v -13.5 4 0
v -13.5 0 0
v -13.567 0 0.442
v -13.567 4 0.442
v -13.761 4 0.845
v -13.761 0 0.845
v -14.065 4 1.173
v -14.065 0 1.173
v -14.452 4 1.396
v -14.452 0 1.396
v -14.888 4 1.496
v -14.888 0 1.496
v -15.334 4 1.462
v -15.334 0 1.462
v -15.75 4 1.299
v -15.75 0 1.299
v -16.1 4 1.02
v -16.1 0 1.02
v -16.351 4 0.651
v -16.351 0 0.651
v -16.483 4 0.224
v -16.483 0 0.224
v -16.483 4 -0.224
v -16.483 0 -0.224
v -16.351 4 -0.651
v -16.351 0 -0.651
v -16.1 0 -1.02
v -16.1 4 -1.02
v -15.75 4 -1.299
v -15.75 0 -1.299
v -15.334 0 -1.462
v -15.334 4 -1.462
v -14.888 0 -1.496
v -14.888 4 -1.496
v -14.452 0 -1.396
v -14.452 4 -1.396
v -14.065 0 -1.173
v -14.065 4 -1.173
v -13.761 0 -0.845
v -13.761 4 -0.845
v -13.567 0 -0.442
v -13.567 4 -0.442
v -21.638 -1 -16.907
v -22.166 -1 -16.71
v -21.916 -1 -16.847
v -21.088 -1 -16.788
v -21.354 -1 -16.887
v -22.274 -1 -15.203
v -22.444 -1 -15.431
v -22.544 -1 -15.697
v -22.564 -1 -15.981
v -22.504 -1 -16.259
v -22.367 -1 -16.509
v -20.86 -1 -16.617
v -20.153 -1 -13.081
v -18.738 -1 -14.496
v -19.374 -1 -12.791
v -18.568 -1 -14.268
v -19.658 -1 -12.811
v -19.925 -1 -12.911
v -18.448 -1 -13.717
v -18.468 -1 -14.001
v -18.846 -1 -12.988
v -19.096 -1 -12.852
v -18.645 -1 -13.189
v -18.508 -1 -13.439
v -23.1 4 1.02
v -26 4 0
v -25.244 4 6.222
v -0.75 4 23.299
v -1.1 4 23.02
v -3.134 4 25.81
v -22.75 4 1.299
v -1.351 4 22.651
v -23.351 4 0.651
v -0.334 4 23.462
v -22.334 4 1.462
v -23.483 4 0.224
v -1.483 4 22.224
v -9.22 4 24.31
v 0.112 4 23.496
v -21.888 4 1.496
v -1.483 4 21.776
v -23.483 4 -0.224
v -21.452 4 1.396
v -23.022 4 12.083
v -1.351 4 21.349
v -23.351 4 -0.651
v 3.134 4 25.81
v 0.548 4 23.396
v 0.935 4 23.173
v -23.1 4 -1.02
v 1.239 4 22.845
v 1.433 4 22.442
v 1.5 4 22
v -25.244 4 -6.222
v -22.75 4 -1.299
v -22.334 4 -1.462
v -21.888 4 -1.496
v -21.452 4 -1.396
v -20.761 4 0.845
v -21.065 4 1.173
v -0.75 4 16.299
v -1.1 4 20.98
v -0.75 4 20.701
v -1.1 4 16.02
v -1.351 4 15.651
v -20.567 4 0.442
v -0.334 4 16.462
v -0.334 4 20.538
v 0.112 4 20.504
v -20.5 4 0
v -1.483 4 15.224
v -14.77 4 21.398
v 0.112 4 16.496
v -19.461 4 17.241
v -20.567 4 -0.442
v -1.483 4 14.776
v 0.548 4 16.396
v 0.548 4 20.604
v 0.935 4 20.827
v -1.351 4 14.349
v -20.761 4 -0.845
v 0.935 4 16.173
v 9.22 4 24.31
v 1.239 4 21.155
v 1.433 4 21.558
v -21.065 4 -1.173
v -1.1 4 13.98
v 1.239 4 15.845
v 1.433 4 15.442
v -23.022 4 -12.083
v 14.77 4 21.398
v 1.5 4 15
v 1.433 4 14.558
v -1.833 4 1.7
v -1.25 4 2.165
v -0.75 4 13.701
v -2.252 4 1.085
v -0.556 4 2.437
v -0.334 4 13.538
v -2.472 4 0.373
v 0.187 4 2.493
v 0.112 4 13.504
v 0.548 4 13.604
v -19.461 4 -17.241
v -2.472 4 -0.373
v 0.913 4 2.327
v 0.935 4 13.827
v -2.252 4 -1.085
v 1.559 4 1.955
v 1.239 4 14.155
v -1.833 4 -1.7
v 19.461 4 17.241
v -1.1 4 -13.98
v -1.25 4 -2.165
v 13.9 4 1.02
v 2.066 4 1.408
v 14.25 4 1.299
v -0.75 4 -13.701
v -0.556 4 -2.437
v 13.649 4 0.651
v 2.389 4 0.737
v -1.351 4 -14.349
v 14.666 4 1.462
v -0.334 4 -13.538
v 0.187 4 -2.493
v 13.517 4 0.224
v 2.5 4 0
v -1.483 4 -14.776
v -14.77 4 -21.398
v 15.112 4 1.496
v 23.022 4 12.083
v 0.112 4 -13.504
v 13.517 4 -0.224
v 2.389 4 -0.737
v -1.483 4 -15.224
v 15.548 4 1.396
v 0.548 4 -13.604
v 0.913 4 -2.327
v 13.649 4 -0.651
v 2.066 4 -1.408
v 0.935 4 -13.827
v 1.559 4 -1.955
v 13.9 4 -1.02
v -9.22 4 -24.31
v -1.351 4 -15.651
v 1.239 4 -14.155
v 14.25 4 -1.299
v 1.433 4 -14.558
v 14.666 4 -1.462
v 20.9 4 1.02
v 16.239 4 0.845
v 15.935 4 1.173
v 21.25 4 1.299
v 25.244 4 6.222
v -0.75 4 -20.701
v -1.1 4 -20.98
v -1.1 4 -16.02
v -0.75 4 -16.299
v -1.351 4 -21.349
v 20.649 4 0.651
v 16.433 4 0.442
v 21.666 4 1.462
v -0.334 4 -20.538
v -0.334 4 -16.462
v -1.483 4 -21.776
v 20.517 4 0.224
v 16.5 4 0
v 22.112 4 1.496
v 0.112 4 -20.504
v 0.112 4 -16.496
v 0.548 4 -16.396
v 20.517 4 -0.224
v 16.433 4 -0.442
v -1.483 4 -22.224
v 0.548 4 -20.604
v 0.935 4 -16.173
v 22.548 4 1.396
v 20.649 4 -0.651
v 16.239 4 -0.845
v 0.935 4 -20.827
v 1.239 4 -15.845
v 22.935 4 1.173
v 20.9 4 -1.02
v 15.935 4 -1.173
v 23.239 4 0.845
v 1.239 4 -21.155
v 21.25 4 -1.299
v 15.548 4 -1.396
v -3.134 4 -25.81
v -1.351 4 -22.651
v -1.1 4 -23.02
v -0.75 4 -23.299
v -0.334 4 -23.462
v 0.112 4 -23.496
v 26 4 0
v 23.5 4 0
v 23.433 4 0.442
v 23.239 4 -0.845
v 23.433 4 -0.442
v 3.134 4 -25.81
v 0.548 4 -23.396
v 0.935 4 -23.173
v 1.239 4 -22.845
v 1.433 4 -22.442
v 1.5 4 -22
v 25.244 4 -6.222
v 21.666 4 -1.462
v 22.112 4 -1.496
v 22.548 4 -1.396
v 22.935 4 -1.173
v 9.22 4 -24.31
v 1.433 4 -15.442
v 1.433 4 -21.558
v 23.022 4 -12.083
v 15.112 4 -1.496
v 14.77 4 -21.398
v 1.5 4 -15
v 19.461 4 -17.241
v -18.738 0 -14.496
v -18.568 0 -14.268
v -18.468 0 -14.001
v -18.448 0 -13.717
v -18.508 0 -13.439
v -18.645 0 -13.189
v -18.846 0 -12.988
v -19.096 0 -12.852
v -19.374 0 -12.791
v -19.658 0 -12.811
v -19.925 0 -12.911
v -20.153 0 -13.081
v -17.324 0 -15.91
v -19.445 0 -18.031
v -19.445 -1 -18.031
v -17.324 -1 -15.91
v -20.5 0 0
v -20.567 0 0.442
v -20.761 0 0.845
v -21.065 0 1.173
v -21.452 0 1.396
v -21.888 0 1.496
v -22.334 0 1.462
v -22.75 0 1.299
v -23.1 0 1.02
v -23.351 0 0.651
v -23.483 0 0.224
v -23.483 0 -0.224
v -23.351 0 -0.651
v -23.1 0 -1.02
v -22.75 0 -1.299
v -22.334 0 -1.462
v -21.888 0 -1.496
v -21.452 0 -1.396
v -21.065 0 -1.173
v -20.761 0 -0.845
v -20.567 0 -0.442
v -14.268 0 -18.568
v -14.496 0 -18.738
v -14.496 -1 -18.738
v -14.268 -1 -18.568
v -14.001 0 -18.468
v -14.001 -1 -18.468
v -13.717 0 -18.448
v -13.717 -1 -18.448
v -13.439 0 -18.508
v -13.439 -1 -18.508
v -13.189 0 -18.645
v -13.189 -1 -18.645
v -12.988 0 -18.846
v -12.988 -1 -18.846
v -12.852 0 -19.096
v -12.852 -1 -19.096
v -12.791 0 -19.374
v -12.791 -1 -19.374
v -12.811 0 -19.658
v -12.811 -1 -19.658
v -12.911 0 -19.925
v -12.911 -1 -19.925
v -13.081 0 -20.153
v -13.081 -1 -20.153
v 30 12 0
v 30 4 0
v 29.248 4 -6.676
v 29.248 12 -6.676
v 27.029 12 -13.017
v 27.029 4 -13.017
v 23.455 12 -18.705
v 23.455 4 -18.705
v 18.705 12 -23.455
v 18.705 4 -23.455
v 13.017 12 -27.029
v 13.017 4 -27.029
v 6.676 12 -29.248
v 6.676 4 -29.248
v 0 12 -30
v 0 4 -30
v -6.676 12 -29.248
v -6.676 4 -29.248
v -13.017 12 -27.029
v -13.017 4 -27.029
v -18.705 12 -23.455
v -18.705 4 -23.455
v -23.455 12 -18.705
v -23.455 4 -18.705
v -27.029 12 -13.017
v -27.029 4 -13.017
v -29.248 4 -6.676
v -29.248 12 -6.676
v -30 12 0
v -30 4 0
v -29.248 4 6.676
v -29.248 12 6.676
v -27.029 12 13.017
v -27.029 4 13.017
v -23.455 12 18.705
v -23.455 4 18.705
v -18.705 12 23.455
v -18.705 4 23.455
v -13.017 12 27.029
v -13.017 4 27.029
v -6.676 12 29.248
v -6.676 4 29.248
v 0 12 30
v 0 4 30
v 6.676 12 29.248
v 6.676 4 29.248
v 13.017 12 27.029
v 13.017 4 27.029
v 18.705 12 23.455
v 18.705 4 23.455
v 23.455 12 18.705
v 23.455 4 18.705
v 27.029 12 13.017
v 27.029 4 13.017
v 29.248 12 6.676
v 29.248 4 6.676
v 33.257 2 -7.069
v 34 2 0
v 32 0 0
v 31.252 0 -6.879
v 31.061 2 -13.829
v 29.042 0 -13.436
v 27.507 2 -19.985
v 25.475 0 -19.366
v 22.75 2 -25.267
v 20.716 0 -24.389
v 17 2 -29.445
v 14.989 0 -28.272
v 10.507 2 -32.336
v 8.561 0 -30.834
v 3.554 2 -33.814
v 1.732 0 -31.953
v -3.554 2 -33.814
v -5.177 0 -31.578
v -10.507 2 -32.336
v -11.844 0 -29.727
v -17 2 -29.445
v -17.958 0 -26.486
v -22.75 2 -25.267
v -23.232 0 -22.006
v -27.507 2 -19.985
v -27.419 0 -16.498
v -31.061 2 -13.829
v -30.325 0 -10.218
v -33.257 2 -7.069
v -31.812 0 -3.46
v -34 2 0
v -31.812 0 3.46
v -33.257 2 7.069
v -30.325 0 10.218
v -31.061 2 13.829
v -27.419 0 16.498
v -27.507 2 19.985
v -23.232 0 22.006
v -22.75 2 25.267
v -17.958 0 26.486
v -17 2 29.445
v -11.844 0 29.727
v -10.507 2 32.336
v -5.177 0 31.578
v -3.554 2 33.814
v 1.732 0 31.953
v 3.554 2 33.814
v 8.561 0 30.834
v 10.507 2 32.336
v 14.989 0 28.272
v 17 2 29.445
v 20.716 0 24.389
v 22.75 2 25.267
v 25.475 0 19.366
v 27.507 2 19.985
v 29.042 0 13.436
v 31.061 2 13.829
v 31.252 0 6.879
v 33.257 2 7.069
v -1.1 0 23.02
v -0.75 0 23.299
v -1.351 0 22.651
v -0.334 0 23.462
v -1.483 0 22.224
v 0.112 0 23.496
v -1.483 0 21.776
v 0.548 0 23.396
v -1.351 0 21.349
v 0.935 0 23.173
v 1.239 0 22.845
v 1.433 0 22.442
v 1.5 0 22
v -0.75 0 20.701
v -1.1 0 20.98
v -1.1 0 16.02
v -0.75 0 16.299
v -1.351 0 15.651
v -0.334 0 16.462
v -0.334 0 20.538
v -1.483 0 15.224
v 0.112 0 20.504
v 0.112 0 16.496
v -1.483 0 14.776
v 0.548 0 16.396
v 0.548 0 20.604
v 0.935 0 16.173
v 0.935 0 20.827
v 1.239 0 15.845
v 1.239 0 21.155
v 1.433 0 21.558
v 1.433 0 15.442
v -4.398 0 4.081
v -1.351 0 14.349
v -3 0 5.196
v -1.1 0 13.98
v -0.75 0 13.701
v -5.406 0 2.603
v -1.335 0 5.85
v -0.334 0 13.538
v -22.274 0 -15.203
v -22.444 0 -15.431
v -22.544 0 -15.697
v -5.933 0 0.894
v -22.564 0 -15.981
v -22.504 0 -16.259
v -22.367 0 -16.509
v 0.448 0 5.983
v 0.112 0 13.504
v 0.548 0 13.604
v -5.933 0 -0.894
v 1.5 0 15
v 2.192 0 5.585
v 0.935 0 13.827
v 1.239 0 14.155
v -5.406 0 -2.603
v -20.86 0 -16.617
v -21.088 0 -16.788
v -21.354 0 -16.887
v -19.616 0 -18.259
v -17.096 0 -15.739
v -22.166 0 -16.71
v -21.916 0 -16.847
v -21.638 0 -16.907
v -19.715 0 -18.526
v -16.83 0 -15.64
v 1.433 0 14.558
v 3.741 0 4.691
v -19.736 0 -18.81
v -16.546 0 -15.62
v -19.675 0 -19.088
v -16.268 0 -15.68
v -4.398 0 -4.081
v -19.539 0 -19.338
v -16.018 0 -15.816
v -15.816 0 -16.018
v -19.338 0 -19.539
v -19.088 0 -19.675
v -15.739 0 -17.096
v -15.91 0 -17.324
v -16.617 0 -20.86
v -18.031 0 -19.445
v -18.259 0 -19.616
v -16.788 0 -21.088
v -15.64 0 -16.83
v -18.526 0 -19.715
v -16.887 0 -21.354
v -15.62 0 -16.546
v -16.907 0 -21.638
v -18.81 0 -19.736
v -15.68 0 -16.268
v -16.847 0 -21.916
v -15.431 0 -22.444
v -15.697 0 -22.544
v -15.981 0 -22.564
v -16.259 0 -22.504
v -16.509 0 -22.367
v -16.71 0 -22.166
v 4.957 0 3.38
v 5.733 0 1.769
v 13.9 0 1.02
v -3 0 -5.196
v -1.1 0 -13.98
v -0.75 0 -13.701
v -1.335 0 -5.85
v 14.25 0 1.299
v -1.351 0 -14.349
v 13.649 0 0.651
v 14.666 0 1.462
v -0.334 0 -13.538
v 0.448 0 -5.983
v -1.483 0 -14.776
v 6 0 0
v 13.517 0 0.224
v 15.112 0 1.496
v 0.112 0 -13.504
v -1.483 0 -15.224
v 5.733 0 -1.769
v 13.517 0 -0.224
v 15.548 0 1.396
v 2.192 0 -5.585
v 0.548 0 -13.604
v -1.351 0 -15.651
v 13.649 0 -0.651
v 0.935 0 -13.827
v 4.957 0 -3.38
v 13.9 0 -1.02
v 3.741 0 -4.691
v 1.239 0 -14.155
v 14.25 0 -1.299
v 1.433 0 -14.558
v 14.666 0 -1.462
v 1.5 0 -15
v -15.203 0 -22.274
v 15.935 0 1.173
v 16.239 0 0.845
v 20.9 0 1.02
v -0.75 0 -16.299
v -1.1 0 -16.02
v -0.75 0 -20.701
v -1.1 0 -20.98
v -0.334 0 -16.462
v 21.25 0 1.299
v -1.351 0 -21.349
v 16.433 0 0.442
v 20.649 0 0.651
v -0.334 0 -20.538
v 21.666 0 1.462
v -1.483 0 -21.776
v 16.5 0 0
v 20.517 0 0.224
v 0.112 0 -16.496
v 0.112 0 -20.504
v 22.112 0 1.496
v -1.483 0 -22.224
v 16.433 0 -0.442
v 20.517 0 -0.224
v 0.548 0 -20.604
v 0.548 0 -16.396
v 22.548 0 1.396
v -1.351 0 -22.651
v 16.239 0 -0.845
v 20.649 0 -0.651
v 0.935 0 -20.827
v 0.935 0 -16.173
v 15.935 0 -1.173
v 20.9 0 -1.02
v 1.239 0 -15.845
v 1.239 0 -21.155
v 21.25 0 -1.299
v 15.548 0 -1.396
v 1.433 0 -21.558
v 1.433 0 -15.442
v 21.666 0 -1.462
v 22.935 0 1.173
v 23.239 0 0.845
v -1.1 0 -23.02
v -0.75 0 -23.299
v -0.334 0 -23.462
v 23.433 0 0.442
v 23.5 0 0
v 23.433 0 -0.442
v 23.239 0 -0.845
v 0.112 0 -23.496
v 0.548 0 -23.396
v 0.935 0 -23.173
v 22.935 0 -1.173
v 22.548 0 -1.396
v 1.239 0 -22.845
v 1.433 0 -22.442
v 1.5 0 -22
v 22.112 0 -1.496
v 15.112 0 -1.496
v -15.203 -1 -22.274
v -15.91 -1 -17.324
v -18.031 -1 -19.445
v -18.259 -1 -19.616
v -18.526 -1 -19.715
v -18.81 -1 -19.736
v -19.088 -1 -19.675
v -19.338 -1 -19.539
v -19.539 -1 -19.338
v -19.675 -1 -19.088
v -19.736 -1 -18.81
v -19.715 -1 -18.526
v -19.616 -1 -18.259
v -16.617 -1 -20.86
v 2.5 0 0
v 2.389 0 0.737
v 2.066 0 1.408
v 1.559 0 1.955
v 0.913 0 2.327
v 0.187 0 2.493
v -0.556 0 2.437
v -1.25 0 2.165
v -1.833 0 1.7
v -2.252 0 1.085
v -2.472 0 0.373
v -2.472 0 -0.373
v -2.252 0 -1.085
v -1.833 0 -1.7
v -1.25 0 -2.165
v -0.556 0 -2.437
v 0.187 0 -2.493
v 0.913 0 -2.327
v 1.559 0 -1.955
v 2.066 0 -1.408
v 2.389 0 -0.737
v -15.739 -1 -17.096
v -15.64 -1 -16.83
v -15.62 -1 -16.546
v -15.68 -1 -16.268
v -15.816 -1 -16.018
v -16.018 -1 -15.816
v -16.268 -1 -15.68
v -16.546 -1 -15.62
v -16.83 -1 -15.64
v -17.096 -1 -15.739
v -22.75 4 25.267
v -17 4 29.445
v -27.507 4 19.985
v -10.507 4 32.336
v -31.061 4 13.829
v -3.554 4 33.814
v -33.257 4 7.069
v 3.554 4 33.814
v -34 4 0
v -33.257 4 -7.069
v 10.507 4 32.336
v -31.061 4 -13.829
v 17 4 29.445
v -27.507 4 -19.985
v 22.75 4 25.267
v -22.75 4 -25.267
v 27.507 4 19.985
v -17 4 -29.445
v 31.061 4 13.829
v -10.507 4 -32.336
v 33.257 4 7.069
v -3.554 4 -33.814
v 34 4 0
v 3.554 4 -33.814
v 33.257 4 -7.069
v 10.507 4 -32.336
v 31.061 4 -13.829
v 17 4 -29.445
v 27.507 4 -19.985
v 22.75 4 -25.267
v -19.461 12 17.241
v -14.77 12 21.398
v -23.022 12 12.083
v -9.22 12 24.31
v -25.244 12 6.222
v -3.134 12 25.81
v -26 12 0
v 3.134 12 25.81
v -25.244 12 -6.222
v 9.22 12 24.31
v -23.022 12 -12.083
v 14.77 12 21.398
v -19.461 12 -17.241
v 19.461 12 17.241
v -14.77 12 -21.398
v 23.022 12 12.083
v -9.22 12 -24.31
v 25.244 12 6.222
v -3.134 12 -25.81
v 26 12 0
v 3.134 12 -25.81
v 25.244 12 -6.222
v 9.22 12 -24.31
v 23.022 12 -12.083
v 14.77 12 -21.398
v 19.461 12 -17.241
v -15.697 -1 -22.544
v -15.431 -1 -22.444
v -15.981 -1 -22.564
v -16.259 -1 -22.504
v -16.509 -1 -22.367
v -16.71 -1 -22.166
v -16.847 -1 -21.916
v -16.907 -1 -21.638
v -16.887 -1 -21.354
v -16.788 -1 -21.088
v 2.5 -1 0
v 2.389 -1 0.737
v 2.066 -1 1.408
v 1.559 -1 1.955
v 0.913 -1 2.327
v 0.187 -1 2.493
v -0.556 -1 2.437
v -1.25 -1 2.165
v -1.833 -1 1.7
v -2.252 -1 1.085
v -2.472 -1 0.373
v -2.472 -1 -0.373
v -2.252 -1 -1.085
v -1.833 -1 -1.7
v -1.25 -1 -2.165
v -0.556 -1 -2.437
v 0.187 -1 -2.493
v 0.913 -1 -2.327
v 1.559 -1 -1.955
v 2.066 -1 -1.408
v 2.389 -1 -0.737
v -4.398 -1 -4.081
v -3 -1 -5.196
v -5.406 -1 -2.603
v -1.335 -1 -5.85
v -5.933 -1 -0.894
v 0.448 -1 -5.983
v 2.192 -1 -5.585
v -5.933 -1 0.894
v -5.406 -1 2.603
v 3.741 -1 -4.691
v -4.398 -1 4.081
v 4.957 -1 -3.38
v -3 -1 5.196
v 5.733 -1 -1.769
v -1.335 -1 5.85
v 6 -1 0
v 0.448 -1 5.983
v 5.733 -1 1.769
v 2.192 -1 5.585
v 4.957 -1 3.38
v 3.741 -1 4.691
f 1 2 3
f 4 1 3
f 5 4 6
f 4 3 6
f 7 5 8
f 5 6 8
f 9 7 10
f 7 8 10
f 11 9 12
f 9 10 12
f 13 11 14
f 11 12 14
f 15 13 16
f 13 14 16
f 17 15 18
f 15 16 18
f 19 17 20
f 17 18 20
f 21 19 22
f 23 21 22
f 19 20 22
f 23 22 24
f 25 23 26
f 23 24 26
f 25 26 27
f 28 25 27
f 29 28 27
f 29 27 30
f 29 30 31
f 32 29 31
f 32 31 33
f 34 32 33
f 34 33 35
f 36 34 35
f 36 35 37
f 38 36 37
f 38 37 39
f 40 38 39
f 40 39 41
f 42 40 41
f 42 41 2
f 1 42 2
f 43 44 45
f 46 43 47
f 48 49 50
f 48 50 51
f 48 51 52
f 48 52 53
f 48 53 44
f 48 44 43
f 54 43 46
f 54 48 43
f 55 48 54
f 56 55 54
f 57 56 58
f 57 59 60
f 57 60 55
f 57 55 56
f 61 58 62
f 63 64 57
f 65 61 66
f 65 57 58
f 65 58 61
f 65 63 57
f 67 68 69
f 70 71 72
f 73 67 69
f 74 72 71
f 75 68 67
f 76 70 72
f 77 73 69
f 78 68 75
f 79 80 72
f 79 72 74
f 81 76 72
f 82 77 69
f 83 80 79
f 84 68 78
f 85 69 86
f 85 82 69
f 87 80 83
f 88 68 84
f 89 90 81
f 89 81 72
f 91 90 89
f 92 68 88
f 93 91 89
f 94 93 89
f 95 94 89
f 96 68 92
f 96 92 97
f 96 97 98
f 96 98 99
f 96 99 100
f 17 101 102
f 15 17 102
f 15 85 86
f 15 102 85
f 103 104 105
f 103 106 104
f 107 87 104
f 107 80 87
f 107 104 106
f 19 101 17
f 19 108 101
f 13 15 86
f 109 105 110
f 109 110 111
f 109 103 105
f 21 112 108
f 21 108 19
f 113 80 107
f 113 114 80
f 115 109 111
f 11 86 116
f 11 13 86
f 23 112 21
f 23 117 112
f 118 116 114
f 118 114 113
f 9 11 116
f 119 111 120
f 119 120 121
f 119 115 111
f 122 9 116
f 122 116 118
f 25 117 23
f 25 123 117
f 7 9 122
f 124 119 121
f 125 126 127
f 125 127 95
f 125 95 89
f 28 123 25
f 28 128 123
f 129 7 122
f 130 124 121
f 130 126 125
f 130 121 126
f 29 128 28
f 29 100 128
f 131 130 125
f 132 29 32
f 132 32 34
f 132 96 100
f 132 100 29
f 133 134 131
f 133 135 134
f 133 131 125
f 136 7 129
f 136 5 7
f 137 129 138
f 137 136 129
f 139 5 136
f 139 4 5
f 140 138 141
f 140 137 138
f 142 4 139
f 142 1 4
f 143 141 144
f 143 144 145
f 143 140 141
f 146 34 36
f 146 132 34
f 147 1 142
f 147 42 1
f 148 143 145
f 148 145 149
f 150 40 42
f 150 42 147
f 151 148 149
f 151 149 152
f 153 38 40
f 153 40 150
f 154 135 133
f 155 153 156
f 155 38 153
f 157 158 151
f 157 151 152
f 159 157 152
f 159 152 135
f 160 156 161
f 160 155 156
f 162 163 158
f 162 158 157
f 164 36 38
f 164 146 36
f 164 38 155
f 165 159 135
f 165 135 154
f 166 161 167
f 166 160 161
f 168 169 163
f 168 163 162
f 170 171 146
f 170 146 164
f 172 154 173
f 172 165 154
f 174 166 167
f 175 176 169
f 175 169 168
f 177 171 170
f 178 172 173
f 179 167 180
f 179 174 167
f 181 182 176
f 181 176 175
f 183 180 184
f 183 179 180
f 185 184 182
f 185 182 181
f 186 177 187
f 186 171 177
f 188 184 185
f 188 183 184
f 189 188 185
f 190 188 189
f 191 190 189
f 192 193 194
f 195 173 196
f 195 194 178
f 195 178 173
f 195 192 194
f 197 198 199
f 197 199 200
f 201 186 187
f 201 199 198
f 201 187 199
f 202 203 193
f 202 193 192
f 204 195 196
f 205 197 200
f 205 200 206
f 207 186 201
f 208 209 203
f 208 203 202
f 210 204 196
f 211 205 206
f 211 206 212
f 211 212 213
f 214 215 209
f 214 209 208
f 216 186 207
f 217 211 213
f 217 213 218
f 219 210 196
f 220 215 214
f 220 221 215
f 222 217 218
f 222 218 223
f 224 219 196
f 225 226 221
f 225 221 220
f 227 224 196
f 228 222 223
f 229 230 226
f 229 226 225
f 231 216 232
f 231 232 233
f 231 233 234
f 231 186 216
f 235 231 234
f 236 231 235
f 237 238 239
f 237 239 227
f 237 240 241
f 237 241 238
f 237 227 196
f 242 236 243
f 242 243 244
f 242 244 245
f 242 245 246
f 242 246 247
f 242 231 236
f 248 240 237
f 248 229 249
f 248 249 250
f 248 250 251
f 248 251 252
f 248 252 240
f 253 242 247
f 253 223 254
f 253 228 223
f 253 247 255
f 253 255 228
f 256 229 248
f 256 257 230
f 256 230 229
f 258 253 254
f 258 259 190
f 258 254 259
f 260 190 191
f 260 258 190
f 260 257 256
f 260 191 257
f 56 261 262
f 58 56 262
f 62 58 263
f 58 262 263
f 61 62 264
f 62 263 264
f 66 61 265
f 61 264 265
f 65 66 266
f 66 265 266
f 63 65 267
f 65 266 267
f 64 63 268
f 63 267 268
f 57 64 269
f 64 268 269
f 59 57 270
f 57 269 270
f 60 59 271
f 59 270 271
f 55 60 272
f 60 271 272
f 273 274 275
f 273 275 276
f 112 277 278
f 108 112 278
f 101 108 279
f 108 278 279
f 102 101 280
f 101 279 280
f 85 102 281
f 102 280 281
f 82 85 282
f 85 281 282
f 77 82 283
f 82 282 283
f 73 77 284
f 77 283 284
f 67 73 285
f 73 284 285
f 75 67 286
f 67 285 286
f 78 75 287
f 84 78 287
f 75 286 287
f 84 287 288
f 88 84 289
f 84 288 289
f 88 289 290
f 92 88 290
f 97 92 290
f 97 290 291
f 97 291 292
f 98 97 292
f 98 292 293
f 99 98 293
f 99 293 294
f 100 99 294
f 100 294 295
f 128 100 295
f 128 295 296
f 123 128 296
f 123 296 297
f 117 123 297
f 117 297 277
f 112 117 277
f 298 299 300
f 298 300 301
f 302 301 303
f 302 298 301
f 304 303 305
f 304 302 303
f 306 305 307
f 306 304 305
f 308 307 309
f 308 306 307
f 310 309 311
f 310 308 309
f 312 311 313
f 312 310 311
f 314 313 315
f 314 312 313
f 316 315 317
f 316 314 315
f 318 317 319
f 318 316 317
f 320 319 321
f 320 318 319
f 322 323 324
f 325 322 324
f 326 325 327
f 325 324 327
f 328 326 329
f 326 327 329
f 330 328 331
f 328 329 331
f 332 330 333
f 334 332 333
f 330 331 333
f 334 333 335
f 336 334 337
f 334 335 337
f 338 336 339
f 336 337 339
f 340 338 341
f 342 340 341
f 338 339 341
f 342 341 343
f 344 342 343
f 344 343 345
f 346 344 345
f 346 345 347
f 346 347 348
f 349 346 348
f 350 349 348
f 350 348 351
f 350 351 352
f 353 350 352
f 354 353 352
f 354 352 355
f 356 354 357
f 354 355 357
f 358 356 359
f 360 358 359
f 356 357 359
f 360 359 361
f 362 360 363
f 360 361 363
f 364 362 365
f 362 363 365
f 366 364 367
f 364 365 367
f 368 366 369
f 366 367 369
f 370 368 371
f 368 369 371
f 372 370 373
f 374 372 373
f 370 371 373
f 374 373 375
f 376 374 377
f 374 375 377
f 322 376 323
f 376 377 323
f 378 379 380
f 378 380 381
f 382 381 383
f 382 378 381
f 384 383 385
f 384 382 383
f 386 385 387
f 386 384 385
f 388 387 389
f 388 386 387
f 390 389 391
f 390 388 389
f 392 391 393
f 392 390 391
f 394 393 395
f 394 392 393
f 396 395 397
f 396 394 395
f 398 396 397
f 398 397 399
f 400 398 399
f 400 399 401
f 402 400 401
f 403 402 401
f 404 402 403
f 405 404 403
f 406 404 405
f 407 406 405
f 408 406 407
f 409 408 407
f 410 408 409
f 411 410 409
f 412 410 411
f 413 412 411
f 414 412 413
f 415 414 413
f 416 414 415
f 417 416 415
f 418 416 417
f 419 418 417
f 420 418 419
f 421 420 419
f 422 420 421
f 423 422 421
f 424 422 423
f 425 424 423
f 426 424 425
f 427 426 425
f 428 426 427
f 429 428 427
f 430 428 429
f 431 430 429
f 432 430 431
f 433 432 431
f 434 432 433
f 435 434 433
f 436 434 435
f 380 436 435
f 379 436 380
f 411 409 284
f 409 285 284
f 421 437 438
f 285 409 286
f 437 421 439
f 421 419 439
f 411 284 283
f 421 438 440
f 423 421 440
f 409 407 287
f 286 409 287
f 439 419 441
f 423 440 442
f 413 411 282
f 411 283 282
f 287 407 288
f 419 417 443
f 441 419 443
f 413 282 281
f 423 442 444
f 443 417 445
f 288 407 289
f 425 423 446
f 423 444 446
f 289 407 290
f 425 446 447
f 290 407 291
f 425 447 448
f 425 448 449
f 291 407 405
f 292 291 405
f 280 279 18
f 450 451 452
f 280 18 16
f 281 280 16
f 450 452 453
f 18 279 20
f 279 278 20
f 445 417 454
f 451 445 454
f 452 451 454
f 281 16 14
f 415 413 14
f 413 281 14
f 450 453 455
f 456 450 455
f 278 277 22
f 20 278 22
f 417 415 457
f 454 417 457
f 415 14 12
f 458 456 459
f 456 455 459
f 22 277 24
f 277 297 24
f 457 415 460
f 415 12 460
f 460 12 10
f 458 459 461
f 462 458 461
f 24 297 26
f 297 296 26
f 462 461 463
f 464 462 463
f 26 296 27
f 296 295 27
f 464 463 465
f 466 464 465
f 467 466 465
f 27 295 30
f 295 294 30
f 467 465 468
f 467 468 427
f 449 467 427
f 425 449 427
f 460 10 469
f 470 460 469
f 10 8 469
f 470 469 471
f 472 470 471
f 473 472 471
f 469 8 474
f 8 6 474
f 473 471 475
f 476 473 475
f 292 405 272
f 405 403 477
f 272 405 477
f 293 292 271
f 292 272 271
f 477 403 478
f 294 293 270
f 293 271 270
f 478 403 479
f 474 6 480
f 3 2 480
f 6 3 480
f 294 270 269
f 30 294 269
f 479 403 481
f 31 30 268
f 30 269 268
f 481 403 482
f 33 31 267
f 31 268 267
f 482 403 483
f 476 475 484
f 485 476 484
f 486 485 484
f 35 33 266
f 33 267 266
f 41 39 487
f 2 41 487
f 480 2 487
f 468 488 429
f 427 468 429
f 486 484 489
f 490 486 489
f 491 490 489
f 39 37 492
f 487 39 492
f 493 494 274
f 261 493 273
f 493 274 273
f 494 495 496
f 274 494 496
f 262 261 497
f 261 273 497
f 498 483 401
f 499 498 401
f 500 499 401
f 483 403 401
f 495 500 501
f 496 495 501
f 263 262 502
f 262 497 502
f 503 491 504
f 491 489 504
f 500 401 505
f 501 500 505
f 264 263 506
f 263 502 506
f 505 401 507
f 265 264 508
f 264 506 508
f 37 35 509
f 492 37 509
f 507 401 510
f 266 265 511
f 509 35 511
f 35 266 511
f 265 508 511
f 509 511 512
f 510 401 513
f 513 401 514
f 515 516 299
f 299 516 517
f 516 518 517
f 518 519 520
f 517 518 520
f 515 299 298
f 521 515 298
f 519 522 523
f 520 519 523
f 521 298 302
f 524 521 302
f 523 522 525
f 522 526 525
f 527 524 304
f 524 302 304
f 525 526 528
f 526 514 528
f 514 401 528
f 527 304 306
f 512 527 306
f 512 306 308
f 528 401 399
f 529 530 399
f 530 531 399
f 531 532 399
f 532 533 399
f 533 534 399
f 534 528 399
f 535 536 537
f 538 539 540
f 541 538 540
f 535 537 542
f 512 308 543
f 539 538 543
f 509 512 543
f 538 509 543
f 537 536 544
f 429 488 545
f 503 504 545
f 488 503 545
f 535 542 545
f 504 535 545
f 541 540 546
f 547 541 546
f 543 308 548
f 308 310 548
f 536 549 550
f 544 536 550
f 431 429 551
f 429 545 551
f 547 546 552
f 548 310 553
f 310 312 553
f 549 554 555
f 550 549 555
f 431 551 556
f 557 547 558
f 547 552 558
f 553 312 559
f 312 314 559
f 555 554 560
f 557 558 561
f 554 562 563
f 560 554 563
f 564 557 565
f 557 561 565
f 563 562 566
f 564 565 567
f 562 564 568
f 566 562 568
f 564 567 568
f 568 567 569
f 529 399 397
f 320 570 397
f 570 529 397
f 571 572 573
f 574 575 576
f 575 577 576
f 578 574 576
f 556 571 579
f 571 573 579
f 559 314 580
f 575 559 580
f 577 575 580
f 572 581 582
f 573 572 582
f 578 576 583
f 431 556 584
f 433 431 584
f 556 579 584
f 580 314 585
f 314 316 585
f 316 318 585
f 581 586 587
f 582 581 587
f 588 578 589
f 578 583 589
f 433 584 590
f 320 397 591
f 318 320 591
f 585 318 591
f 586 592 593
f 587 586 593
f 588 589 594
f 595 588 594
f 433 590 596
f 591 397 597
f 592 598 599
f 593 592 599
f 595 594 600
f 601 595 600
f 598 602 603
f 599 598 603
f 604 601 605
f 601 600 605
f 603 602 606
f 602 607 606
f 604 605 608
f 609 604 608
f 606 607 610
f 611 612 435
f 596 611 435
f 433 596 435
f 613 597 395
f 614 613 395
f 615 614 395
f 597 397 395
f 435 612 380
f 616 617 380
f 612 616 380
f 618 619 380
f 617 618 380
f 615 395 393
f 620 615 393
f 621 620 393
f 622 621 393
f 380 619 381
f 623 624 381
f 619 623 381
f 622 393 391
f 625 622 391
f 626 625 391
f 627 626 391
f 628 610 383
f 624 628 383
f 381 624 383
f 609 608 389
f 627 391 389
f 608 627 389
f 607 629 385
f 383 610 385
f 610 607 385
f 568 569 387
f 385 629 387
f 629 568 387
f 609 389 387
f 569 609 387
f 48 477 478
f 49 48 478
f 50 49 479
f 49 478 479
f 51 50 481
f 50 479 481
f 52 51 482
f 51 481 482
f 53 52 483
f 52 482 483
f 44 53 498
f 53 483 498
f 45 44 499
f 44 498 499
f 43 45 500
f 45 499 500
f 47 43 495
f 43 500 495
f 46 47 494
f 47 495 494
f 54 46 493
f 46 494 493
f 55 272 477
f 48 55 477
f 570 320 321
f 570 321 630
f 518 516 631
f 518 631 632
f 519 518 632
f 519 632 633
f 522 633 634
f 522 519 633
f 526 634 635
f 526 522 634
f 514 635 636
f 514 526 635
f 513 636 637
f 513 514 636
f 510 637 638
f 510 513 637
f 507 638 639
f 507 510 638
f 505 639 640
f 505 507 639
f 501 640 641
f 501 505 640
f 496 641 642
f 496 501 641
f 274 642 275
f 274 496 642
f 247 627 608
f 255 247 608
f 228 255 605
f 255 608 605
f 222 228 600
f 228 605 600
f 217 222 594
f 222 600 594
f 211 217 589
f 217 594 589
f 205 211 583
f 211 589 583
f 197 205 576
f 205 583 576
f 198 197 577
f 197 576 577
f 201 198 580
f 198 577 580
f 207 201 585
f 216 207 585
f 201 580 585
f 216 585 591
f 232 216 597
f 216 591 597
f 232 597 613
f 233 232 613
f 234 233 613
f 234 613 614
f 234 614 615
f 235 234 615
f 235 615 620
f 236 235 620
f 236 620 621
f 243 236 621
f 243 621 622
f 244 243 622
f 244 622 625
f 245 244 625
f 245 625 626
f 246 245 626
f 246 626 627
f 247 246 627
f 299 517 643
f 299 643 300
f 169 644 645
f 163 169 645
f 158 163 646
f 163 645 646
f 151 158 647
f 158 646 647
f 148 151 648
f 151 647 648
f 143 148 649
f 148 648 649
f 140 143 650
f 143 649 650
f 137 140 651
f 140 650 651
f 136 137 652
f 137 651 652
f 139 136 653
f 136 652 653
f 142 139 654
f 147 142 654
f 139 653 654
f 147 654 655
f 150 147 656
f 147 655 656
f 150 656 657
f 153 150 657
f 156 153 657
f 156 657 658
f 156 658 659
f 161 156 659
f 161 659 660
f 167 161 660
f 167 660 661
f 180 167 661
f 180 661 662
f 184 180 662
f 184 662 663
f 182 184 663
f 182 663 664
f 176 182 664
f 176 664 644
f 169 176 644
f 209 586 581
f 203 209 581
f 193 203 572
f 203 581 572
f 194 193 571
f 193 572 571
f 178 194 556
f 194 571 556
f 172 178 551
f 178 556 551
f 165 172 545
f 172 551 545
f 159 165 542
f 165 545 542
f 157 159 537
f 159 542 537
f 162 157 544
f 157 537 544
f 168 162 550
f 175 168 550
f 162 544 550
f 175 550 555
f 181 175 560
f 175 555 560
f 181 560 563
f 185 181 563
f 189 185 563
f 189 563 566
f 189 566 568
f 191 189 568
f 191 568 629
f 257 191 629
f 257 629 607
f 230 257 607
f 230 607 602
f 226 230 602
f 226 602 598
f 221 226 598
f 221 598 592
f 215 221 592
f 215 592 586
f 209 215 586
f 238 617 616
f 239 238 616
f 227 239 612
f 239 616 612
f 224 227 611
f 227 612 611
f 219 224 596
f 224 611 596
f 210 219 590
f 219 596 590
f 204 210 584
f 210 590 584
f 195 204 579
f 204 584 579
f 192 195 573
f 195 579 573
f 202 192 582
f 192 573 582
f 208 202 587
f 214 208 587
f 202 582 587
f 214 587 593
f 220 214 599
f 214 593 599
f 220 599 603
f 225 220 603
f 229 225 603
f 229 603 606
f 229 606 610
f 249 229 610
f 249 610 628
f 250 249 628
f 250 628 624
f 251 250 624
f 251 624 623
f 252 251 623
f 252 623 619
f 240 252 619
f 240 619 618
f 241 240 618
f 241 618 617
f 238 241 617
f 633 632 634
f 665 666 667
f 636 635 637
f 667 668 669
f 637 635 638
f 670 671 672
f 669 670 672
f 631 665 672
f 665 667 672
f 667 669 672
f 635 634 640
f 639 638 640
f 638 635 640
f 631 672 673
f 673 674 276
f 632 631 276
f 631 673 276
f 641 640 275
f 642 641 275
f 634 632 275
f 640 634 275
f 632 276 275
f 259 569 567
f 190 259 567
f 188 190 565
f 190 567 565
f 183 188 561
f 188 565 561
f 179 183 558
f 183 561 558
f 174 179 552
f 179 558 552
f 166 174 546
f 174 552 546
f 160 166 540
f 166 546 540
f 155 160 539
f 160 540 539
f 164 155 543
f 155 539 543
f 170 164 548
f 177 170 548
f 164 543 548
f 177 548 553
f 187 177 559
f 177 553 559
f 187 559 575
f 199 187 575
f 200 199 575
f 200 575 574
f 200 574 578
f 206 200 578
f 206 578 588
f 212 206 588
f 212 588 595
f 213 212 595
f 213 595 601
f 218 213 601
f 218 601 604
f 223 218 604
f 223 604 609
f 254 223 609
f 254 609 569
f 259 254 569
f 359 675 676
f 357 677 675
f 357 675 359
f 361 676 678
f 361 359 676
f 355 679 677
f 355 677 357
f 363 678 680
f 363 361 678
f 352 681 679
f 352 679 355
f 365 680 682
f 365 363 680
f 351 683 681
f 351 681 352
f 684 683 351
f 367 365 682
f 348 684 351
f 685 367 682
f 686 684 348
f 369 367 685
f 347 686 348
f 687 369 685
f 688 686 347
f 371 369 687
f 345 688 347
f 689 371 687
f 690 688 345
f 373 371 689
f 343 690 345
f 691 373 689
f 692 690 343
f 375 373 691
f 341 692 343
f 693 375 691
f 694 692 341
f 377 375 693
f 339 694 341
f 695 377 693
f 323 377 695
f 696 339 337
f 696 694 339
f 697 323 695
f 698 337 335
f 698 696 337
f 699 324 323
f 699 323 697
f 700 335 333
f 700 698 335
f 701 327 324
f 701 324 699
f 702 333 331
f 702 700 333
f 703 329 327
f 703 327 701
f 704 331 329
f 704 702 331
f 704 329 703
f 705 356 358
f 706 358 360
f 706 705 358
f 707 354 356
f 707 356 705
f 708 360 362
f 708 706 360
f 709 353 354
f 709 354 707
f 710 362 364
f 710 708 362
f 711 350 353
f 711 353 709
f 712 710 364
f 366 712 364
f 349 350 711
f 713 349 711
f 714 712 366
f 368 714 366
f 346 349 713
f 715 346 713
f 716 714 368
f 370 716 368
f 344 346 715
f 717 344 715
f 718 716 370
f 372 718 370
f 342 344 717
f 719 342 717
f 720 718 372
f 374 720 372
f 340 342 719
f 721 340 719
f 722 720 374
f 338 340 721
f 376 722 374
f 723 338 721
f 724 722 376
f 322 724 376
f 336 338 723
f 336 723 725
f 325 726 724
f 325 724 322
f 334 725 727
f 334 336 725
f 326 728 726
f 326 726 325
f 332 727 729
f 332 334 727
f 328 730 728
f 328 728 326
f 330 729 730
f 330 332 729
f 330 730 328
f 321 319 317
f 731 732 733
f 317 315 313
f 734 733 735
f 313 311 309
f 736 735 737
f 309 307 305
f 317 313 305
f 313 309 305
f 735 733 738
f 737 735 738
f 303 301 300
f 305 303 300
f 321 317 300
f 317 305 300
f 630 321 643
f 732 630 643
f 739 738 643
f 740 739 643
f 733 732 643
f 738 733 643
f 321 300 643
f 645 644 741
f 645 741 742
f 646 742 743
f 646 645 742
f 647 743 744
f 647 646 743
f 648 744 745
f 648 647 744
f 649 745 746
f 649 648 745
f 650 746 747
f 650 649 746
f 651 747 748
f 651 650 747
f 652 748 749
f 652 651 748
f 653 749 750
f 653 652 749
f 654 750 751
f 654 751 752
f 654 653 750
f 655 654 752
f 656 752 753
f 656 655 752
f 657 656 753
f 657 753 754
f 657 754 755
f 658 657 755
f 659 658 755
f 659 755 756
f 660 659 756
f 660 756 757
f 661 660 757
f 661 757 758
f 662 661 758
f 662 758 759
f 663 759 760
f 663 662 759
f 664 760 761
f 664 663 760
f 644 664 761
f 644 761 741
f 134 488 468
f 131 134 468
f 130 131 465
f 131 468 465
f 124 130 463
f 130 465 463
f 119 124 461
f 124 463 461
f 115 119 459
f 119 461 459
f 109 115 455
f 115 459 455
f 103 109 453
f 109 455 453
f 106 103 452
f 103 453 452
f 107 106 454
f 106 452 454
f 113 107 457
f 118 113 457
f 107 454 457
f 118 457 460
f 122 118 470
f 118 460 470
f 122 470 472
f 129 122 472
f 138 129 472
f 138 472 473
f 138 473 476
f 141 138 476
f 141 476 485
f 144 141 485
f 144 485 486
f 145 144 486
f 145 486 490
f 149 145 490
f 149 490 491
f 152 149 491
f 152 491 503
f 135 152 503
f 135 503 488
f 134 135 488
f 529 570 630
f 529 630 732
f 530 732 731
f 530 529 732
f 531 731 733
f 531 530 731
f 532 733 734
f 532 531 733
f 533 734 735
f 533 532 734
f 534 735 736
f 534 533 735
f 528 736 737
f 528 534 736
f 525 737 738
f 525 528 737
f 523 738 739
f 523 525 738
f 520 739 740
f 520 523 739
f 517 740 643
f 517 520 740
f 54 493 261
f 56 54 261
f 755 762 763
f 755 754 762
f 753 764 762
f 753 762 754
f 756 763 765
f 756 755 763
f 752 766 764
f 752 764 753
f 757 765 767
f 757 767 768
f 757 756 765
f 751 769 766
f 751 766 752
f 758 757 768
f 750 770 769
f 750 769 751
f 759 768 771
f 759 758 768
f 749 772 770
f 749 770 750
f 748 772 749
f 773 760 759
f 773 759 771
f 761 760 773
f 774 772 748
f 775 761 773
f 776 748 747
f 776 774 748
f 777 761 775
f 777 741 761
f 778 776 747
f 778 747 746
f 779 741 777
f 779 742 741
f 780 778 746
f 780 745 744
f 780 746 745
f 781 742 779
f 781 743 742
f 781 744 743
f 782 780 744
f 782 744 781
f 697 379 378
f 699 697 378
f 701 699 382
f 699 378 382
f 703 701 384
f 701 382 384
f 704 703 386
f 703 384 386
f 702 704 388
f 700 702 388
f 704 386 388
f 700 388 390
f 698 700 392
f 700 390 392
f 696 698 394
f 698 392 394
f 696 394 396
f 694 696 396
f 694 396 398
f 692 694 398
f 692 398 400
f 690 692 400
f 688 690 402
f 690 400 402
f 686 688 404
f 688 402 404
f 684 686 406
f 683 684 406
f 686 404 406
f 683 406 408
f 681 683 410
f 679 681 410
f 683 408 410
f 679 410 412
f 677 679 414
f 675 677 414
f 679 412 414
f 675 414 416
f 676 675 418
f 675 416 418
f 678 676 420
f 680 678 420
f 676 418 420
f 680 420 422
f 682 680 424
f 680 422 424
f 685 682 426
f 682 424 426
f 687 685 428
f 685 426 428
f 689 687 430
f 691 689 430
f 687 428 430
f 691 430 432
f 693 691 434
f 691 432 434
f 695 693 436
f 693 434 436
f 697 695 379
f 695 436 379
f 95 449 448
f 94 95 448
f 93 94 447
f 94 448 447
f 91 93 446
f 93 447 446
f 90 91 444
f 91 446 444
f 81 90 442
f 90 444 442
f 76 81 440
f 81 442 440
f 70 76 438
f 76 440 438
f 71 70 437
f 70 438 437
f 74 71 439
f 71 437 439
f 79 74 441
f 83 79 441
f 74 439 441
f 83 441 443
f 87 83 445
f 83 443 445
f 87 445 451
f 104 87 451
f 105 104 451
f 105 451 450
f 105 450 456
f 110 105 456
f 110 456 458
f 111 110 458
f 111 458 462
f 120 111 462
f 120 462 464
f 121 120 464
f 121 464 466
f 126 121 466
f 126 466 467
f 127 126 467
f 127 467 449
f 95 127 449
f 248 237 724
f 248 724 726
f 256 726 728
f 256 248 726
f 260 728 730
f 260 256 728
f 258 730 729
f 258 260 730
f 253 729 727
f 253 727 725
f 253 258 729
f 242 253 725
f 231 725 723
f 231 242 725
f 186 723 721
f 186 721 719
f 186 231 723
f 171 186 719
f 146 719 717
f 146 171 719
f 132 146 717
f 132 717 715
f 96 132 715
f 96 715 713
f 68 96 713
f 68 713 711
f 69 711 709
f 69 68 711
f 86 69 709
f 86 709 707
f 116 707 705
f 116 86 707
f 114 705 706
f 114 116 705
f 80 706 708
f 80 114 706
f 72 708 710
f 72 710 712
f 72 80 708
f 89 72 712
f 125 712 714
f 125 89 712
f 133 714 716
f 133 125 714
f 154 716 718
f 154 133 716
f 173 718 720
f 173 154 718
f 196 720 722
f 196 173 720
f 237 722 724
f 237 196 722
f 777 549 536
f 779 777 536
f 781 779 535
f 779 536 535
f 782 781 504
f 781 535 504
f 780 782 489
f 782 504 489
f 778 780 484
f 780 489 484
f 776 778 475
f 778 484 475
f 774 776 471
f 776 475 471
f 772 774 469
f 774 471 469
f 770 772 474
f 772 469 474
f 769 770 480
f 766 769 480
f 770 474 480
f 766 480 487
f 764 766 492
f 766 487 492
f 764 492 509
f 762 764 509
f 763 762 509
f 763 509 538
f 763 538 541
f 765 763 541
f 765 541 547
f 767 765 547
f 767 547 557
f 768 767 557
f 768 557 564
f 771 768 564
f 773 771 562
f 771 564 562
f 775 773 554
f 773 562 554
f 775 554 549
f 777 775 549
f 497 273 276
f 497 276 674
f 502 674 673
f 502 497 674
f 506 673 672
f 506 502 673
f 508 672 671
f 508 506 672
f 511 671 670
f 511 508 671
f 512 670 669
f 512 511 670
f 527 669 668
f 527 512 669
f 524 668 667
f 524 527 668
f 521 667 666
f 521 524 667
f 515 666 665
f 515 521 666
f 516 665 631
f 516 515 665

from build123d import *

# Parameters (mm, degrees)
SKETCH_1_R          = 34
EXTRUDE_1_DEPTH     = 4
SKETCH_2_R          = 30
SKETCH_2_R_2        = 26
EXTRUDE_2_DEPTH     = 8
SKETCH_3_R          = 2.5
SKETCH_3_R_2        = 1.5
CUT_EXTRUDE_1_DEPTH = 13
SKETCH_4_R          = 6
SKETCH_4_R_2        = 2.5
EXTRUDE_3_DEPTH     = 1
CHAMFER_1_SIZE      = 2
EXTRUDE_4_DEPTH     = 1


with BuildPart() as part:
    # 草图1 → 凸台-拉伸1 (new body)
    with BuildSketch(Plane(origin=(0, 0, 0), x_dir=(1, 0, 0), z_dir=(0, 1, 0))):
        Circle(SKETCH_1_R)
    extrude(amount=EXTRUDE_1_DEPTH)

    # 草图2 → 凸台-拉伸2 (add)
    with BuildSketch(Plane(origin=(0, 4, 0), x_dir=(1, 0, 0), z_dir=(0, 1, 0))):
        Circle(SKETCH_2_R)
        Circle(SKETCH_2_R_2, mode=Mode.SUBTRACT)
    extrude(amount=EXTRUDE_2_DEPTH)

    # 草图3 → 切除-拉伸1 (cut, through all)
    with BuildSketch(Plane.XZ):
        Circle(SKETCH_3_R)
        with Locations((0, 15)):
            Circle(SKETCH_3_R_2)
        with Locations((0, 22)):
            Circle(SKETCH_3_R_2)
        with Locations((15, 0)):
            Circle(SKETCH_3_R_2)
        with Locations((22, 0)):
            Circle(SKETCH_3_R_2)
        with Locations((0, -15)):
            Circle(SKETCH_3_R_2)
        with Locations((0, -22)):
            Circle(SKETCH_3_R_2)
        with Locations((-15, 0)):
            Circle(SKETCH_3_R_2)
        with Locations((-22, 0)):
            Circle(SKETCH_3_R_2)
    extrude(amount=-CUT_EXTRUDE_1_DEPTH, mode=Mode.SUBTRACT)

    # 草图4 → 凸台-拉伸3 (add)
    with BuildSketch(Plane.XZ):
        Circle(SKETCH_4_R)
        Circle(SKETCH_4_R_2, mode=Mode.SUBTRACT)
    extrude(amount=EXTRUDE_3_DEPTH)

    # 倒角1
    chamfer_1_edges = [part.edges().sort_by_distance(p)[0] for p in [
        (-34, 0, 0),
    ]]
    chamfer(chamfer_1_edges, length=CHAMFER_1_SIZE)

    # 草图5 → 凸台-拉伸4 (add)
    with BuildSketch(Plane.XZ):
        with BuildLine():
            Line((-19.445436483, -18.03122292), (-17.324116139, -15.909902577))
            ThreePointArc((-17.324116139, -15.909902577), (-15.909902577, -15.909902577), (-15.909902577, -17.324116139))
            Line((-15.909902577, -17.324116139), (-18.03122292, -19.445436483))
            ThreePointArc((-18.03122292, -19.445436483), (-19.445436483, -19.445436483), (-19.445436483, -18.03122292))
        make_face()
        with BuildLine():
            Line((-13.081475452, -20.152543264), (-15.202795796, -22.273863607))
            ThreePointArc((-15.202795796, -22.273863607), (-16.617009358, -22.273863607), (-16.617009358, -20.859650045))
            Line((-16.617009358, -20.859650045), (-14.495689014, -18.738329701))
            ThreePointArc((-14.495689014, -18.738329701), (-13.081475452, -18.738329701), (-13.081475452, -20.152543264))
        make_face()
        with BuildLine():
            Line((-20.152543264, -13.081475452), (-22.273863607, -15.202795796))
            ThreePointArc((-22.273863607, -15.202795796), (-22.273863607, -16.617009358), (-20.859650045, -16.617009358))
            Line((-20.859650045, -16.617009358), (-18.738329701, -14.495689014))
            ThreePointArc((-18.738329701, -14.495689014), (-18.738329701, -13.081475452), (-20.152543264, -13.081475452))
        make_face()
    extrude(amount=EXTRUDE_4_DEPTH)


solid = part.part
